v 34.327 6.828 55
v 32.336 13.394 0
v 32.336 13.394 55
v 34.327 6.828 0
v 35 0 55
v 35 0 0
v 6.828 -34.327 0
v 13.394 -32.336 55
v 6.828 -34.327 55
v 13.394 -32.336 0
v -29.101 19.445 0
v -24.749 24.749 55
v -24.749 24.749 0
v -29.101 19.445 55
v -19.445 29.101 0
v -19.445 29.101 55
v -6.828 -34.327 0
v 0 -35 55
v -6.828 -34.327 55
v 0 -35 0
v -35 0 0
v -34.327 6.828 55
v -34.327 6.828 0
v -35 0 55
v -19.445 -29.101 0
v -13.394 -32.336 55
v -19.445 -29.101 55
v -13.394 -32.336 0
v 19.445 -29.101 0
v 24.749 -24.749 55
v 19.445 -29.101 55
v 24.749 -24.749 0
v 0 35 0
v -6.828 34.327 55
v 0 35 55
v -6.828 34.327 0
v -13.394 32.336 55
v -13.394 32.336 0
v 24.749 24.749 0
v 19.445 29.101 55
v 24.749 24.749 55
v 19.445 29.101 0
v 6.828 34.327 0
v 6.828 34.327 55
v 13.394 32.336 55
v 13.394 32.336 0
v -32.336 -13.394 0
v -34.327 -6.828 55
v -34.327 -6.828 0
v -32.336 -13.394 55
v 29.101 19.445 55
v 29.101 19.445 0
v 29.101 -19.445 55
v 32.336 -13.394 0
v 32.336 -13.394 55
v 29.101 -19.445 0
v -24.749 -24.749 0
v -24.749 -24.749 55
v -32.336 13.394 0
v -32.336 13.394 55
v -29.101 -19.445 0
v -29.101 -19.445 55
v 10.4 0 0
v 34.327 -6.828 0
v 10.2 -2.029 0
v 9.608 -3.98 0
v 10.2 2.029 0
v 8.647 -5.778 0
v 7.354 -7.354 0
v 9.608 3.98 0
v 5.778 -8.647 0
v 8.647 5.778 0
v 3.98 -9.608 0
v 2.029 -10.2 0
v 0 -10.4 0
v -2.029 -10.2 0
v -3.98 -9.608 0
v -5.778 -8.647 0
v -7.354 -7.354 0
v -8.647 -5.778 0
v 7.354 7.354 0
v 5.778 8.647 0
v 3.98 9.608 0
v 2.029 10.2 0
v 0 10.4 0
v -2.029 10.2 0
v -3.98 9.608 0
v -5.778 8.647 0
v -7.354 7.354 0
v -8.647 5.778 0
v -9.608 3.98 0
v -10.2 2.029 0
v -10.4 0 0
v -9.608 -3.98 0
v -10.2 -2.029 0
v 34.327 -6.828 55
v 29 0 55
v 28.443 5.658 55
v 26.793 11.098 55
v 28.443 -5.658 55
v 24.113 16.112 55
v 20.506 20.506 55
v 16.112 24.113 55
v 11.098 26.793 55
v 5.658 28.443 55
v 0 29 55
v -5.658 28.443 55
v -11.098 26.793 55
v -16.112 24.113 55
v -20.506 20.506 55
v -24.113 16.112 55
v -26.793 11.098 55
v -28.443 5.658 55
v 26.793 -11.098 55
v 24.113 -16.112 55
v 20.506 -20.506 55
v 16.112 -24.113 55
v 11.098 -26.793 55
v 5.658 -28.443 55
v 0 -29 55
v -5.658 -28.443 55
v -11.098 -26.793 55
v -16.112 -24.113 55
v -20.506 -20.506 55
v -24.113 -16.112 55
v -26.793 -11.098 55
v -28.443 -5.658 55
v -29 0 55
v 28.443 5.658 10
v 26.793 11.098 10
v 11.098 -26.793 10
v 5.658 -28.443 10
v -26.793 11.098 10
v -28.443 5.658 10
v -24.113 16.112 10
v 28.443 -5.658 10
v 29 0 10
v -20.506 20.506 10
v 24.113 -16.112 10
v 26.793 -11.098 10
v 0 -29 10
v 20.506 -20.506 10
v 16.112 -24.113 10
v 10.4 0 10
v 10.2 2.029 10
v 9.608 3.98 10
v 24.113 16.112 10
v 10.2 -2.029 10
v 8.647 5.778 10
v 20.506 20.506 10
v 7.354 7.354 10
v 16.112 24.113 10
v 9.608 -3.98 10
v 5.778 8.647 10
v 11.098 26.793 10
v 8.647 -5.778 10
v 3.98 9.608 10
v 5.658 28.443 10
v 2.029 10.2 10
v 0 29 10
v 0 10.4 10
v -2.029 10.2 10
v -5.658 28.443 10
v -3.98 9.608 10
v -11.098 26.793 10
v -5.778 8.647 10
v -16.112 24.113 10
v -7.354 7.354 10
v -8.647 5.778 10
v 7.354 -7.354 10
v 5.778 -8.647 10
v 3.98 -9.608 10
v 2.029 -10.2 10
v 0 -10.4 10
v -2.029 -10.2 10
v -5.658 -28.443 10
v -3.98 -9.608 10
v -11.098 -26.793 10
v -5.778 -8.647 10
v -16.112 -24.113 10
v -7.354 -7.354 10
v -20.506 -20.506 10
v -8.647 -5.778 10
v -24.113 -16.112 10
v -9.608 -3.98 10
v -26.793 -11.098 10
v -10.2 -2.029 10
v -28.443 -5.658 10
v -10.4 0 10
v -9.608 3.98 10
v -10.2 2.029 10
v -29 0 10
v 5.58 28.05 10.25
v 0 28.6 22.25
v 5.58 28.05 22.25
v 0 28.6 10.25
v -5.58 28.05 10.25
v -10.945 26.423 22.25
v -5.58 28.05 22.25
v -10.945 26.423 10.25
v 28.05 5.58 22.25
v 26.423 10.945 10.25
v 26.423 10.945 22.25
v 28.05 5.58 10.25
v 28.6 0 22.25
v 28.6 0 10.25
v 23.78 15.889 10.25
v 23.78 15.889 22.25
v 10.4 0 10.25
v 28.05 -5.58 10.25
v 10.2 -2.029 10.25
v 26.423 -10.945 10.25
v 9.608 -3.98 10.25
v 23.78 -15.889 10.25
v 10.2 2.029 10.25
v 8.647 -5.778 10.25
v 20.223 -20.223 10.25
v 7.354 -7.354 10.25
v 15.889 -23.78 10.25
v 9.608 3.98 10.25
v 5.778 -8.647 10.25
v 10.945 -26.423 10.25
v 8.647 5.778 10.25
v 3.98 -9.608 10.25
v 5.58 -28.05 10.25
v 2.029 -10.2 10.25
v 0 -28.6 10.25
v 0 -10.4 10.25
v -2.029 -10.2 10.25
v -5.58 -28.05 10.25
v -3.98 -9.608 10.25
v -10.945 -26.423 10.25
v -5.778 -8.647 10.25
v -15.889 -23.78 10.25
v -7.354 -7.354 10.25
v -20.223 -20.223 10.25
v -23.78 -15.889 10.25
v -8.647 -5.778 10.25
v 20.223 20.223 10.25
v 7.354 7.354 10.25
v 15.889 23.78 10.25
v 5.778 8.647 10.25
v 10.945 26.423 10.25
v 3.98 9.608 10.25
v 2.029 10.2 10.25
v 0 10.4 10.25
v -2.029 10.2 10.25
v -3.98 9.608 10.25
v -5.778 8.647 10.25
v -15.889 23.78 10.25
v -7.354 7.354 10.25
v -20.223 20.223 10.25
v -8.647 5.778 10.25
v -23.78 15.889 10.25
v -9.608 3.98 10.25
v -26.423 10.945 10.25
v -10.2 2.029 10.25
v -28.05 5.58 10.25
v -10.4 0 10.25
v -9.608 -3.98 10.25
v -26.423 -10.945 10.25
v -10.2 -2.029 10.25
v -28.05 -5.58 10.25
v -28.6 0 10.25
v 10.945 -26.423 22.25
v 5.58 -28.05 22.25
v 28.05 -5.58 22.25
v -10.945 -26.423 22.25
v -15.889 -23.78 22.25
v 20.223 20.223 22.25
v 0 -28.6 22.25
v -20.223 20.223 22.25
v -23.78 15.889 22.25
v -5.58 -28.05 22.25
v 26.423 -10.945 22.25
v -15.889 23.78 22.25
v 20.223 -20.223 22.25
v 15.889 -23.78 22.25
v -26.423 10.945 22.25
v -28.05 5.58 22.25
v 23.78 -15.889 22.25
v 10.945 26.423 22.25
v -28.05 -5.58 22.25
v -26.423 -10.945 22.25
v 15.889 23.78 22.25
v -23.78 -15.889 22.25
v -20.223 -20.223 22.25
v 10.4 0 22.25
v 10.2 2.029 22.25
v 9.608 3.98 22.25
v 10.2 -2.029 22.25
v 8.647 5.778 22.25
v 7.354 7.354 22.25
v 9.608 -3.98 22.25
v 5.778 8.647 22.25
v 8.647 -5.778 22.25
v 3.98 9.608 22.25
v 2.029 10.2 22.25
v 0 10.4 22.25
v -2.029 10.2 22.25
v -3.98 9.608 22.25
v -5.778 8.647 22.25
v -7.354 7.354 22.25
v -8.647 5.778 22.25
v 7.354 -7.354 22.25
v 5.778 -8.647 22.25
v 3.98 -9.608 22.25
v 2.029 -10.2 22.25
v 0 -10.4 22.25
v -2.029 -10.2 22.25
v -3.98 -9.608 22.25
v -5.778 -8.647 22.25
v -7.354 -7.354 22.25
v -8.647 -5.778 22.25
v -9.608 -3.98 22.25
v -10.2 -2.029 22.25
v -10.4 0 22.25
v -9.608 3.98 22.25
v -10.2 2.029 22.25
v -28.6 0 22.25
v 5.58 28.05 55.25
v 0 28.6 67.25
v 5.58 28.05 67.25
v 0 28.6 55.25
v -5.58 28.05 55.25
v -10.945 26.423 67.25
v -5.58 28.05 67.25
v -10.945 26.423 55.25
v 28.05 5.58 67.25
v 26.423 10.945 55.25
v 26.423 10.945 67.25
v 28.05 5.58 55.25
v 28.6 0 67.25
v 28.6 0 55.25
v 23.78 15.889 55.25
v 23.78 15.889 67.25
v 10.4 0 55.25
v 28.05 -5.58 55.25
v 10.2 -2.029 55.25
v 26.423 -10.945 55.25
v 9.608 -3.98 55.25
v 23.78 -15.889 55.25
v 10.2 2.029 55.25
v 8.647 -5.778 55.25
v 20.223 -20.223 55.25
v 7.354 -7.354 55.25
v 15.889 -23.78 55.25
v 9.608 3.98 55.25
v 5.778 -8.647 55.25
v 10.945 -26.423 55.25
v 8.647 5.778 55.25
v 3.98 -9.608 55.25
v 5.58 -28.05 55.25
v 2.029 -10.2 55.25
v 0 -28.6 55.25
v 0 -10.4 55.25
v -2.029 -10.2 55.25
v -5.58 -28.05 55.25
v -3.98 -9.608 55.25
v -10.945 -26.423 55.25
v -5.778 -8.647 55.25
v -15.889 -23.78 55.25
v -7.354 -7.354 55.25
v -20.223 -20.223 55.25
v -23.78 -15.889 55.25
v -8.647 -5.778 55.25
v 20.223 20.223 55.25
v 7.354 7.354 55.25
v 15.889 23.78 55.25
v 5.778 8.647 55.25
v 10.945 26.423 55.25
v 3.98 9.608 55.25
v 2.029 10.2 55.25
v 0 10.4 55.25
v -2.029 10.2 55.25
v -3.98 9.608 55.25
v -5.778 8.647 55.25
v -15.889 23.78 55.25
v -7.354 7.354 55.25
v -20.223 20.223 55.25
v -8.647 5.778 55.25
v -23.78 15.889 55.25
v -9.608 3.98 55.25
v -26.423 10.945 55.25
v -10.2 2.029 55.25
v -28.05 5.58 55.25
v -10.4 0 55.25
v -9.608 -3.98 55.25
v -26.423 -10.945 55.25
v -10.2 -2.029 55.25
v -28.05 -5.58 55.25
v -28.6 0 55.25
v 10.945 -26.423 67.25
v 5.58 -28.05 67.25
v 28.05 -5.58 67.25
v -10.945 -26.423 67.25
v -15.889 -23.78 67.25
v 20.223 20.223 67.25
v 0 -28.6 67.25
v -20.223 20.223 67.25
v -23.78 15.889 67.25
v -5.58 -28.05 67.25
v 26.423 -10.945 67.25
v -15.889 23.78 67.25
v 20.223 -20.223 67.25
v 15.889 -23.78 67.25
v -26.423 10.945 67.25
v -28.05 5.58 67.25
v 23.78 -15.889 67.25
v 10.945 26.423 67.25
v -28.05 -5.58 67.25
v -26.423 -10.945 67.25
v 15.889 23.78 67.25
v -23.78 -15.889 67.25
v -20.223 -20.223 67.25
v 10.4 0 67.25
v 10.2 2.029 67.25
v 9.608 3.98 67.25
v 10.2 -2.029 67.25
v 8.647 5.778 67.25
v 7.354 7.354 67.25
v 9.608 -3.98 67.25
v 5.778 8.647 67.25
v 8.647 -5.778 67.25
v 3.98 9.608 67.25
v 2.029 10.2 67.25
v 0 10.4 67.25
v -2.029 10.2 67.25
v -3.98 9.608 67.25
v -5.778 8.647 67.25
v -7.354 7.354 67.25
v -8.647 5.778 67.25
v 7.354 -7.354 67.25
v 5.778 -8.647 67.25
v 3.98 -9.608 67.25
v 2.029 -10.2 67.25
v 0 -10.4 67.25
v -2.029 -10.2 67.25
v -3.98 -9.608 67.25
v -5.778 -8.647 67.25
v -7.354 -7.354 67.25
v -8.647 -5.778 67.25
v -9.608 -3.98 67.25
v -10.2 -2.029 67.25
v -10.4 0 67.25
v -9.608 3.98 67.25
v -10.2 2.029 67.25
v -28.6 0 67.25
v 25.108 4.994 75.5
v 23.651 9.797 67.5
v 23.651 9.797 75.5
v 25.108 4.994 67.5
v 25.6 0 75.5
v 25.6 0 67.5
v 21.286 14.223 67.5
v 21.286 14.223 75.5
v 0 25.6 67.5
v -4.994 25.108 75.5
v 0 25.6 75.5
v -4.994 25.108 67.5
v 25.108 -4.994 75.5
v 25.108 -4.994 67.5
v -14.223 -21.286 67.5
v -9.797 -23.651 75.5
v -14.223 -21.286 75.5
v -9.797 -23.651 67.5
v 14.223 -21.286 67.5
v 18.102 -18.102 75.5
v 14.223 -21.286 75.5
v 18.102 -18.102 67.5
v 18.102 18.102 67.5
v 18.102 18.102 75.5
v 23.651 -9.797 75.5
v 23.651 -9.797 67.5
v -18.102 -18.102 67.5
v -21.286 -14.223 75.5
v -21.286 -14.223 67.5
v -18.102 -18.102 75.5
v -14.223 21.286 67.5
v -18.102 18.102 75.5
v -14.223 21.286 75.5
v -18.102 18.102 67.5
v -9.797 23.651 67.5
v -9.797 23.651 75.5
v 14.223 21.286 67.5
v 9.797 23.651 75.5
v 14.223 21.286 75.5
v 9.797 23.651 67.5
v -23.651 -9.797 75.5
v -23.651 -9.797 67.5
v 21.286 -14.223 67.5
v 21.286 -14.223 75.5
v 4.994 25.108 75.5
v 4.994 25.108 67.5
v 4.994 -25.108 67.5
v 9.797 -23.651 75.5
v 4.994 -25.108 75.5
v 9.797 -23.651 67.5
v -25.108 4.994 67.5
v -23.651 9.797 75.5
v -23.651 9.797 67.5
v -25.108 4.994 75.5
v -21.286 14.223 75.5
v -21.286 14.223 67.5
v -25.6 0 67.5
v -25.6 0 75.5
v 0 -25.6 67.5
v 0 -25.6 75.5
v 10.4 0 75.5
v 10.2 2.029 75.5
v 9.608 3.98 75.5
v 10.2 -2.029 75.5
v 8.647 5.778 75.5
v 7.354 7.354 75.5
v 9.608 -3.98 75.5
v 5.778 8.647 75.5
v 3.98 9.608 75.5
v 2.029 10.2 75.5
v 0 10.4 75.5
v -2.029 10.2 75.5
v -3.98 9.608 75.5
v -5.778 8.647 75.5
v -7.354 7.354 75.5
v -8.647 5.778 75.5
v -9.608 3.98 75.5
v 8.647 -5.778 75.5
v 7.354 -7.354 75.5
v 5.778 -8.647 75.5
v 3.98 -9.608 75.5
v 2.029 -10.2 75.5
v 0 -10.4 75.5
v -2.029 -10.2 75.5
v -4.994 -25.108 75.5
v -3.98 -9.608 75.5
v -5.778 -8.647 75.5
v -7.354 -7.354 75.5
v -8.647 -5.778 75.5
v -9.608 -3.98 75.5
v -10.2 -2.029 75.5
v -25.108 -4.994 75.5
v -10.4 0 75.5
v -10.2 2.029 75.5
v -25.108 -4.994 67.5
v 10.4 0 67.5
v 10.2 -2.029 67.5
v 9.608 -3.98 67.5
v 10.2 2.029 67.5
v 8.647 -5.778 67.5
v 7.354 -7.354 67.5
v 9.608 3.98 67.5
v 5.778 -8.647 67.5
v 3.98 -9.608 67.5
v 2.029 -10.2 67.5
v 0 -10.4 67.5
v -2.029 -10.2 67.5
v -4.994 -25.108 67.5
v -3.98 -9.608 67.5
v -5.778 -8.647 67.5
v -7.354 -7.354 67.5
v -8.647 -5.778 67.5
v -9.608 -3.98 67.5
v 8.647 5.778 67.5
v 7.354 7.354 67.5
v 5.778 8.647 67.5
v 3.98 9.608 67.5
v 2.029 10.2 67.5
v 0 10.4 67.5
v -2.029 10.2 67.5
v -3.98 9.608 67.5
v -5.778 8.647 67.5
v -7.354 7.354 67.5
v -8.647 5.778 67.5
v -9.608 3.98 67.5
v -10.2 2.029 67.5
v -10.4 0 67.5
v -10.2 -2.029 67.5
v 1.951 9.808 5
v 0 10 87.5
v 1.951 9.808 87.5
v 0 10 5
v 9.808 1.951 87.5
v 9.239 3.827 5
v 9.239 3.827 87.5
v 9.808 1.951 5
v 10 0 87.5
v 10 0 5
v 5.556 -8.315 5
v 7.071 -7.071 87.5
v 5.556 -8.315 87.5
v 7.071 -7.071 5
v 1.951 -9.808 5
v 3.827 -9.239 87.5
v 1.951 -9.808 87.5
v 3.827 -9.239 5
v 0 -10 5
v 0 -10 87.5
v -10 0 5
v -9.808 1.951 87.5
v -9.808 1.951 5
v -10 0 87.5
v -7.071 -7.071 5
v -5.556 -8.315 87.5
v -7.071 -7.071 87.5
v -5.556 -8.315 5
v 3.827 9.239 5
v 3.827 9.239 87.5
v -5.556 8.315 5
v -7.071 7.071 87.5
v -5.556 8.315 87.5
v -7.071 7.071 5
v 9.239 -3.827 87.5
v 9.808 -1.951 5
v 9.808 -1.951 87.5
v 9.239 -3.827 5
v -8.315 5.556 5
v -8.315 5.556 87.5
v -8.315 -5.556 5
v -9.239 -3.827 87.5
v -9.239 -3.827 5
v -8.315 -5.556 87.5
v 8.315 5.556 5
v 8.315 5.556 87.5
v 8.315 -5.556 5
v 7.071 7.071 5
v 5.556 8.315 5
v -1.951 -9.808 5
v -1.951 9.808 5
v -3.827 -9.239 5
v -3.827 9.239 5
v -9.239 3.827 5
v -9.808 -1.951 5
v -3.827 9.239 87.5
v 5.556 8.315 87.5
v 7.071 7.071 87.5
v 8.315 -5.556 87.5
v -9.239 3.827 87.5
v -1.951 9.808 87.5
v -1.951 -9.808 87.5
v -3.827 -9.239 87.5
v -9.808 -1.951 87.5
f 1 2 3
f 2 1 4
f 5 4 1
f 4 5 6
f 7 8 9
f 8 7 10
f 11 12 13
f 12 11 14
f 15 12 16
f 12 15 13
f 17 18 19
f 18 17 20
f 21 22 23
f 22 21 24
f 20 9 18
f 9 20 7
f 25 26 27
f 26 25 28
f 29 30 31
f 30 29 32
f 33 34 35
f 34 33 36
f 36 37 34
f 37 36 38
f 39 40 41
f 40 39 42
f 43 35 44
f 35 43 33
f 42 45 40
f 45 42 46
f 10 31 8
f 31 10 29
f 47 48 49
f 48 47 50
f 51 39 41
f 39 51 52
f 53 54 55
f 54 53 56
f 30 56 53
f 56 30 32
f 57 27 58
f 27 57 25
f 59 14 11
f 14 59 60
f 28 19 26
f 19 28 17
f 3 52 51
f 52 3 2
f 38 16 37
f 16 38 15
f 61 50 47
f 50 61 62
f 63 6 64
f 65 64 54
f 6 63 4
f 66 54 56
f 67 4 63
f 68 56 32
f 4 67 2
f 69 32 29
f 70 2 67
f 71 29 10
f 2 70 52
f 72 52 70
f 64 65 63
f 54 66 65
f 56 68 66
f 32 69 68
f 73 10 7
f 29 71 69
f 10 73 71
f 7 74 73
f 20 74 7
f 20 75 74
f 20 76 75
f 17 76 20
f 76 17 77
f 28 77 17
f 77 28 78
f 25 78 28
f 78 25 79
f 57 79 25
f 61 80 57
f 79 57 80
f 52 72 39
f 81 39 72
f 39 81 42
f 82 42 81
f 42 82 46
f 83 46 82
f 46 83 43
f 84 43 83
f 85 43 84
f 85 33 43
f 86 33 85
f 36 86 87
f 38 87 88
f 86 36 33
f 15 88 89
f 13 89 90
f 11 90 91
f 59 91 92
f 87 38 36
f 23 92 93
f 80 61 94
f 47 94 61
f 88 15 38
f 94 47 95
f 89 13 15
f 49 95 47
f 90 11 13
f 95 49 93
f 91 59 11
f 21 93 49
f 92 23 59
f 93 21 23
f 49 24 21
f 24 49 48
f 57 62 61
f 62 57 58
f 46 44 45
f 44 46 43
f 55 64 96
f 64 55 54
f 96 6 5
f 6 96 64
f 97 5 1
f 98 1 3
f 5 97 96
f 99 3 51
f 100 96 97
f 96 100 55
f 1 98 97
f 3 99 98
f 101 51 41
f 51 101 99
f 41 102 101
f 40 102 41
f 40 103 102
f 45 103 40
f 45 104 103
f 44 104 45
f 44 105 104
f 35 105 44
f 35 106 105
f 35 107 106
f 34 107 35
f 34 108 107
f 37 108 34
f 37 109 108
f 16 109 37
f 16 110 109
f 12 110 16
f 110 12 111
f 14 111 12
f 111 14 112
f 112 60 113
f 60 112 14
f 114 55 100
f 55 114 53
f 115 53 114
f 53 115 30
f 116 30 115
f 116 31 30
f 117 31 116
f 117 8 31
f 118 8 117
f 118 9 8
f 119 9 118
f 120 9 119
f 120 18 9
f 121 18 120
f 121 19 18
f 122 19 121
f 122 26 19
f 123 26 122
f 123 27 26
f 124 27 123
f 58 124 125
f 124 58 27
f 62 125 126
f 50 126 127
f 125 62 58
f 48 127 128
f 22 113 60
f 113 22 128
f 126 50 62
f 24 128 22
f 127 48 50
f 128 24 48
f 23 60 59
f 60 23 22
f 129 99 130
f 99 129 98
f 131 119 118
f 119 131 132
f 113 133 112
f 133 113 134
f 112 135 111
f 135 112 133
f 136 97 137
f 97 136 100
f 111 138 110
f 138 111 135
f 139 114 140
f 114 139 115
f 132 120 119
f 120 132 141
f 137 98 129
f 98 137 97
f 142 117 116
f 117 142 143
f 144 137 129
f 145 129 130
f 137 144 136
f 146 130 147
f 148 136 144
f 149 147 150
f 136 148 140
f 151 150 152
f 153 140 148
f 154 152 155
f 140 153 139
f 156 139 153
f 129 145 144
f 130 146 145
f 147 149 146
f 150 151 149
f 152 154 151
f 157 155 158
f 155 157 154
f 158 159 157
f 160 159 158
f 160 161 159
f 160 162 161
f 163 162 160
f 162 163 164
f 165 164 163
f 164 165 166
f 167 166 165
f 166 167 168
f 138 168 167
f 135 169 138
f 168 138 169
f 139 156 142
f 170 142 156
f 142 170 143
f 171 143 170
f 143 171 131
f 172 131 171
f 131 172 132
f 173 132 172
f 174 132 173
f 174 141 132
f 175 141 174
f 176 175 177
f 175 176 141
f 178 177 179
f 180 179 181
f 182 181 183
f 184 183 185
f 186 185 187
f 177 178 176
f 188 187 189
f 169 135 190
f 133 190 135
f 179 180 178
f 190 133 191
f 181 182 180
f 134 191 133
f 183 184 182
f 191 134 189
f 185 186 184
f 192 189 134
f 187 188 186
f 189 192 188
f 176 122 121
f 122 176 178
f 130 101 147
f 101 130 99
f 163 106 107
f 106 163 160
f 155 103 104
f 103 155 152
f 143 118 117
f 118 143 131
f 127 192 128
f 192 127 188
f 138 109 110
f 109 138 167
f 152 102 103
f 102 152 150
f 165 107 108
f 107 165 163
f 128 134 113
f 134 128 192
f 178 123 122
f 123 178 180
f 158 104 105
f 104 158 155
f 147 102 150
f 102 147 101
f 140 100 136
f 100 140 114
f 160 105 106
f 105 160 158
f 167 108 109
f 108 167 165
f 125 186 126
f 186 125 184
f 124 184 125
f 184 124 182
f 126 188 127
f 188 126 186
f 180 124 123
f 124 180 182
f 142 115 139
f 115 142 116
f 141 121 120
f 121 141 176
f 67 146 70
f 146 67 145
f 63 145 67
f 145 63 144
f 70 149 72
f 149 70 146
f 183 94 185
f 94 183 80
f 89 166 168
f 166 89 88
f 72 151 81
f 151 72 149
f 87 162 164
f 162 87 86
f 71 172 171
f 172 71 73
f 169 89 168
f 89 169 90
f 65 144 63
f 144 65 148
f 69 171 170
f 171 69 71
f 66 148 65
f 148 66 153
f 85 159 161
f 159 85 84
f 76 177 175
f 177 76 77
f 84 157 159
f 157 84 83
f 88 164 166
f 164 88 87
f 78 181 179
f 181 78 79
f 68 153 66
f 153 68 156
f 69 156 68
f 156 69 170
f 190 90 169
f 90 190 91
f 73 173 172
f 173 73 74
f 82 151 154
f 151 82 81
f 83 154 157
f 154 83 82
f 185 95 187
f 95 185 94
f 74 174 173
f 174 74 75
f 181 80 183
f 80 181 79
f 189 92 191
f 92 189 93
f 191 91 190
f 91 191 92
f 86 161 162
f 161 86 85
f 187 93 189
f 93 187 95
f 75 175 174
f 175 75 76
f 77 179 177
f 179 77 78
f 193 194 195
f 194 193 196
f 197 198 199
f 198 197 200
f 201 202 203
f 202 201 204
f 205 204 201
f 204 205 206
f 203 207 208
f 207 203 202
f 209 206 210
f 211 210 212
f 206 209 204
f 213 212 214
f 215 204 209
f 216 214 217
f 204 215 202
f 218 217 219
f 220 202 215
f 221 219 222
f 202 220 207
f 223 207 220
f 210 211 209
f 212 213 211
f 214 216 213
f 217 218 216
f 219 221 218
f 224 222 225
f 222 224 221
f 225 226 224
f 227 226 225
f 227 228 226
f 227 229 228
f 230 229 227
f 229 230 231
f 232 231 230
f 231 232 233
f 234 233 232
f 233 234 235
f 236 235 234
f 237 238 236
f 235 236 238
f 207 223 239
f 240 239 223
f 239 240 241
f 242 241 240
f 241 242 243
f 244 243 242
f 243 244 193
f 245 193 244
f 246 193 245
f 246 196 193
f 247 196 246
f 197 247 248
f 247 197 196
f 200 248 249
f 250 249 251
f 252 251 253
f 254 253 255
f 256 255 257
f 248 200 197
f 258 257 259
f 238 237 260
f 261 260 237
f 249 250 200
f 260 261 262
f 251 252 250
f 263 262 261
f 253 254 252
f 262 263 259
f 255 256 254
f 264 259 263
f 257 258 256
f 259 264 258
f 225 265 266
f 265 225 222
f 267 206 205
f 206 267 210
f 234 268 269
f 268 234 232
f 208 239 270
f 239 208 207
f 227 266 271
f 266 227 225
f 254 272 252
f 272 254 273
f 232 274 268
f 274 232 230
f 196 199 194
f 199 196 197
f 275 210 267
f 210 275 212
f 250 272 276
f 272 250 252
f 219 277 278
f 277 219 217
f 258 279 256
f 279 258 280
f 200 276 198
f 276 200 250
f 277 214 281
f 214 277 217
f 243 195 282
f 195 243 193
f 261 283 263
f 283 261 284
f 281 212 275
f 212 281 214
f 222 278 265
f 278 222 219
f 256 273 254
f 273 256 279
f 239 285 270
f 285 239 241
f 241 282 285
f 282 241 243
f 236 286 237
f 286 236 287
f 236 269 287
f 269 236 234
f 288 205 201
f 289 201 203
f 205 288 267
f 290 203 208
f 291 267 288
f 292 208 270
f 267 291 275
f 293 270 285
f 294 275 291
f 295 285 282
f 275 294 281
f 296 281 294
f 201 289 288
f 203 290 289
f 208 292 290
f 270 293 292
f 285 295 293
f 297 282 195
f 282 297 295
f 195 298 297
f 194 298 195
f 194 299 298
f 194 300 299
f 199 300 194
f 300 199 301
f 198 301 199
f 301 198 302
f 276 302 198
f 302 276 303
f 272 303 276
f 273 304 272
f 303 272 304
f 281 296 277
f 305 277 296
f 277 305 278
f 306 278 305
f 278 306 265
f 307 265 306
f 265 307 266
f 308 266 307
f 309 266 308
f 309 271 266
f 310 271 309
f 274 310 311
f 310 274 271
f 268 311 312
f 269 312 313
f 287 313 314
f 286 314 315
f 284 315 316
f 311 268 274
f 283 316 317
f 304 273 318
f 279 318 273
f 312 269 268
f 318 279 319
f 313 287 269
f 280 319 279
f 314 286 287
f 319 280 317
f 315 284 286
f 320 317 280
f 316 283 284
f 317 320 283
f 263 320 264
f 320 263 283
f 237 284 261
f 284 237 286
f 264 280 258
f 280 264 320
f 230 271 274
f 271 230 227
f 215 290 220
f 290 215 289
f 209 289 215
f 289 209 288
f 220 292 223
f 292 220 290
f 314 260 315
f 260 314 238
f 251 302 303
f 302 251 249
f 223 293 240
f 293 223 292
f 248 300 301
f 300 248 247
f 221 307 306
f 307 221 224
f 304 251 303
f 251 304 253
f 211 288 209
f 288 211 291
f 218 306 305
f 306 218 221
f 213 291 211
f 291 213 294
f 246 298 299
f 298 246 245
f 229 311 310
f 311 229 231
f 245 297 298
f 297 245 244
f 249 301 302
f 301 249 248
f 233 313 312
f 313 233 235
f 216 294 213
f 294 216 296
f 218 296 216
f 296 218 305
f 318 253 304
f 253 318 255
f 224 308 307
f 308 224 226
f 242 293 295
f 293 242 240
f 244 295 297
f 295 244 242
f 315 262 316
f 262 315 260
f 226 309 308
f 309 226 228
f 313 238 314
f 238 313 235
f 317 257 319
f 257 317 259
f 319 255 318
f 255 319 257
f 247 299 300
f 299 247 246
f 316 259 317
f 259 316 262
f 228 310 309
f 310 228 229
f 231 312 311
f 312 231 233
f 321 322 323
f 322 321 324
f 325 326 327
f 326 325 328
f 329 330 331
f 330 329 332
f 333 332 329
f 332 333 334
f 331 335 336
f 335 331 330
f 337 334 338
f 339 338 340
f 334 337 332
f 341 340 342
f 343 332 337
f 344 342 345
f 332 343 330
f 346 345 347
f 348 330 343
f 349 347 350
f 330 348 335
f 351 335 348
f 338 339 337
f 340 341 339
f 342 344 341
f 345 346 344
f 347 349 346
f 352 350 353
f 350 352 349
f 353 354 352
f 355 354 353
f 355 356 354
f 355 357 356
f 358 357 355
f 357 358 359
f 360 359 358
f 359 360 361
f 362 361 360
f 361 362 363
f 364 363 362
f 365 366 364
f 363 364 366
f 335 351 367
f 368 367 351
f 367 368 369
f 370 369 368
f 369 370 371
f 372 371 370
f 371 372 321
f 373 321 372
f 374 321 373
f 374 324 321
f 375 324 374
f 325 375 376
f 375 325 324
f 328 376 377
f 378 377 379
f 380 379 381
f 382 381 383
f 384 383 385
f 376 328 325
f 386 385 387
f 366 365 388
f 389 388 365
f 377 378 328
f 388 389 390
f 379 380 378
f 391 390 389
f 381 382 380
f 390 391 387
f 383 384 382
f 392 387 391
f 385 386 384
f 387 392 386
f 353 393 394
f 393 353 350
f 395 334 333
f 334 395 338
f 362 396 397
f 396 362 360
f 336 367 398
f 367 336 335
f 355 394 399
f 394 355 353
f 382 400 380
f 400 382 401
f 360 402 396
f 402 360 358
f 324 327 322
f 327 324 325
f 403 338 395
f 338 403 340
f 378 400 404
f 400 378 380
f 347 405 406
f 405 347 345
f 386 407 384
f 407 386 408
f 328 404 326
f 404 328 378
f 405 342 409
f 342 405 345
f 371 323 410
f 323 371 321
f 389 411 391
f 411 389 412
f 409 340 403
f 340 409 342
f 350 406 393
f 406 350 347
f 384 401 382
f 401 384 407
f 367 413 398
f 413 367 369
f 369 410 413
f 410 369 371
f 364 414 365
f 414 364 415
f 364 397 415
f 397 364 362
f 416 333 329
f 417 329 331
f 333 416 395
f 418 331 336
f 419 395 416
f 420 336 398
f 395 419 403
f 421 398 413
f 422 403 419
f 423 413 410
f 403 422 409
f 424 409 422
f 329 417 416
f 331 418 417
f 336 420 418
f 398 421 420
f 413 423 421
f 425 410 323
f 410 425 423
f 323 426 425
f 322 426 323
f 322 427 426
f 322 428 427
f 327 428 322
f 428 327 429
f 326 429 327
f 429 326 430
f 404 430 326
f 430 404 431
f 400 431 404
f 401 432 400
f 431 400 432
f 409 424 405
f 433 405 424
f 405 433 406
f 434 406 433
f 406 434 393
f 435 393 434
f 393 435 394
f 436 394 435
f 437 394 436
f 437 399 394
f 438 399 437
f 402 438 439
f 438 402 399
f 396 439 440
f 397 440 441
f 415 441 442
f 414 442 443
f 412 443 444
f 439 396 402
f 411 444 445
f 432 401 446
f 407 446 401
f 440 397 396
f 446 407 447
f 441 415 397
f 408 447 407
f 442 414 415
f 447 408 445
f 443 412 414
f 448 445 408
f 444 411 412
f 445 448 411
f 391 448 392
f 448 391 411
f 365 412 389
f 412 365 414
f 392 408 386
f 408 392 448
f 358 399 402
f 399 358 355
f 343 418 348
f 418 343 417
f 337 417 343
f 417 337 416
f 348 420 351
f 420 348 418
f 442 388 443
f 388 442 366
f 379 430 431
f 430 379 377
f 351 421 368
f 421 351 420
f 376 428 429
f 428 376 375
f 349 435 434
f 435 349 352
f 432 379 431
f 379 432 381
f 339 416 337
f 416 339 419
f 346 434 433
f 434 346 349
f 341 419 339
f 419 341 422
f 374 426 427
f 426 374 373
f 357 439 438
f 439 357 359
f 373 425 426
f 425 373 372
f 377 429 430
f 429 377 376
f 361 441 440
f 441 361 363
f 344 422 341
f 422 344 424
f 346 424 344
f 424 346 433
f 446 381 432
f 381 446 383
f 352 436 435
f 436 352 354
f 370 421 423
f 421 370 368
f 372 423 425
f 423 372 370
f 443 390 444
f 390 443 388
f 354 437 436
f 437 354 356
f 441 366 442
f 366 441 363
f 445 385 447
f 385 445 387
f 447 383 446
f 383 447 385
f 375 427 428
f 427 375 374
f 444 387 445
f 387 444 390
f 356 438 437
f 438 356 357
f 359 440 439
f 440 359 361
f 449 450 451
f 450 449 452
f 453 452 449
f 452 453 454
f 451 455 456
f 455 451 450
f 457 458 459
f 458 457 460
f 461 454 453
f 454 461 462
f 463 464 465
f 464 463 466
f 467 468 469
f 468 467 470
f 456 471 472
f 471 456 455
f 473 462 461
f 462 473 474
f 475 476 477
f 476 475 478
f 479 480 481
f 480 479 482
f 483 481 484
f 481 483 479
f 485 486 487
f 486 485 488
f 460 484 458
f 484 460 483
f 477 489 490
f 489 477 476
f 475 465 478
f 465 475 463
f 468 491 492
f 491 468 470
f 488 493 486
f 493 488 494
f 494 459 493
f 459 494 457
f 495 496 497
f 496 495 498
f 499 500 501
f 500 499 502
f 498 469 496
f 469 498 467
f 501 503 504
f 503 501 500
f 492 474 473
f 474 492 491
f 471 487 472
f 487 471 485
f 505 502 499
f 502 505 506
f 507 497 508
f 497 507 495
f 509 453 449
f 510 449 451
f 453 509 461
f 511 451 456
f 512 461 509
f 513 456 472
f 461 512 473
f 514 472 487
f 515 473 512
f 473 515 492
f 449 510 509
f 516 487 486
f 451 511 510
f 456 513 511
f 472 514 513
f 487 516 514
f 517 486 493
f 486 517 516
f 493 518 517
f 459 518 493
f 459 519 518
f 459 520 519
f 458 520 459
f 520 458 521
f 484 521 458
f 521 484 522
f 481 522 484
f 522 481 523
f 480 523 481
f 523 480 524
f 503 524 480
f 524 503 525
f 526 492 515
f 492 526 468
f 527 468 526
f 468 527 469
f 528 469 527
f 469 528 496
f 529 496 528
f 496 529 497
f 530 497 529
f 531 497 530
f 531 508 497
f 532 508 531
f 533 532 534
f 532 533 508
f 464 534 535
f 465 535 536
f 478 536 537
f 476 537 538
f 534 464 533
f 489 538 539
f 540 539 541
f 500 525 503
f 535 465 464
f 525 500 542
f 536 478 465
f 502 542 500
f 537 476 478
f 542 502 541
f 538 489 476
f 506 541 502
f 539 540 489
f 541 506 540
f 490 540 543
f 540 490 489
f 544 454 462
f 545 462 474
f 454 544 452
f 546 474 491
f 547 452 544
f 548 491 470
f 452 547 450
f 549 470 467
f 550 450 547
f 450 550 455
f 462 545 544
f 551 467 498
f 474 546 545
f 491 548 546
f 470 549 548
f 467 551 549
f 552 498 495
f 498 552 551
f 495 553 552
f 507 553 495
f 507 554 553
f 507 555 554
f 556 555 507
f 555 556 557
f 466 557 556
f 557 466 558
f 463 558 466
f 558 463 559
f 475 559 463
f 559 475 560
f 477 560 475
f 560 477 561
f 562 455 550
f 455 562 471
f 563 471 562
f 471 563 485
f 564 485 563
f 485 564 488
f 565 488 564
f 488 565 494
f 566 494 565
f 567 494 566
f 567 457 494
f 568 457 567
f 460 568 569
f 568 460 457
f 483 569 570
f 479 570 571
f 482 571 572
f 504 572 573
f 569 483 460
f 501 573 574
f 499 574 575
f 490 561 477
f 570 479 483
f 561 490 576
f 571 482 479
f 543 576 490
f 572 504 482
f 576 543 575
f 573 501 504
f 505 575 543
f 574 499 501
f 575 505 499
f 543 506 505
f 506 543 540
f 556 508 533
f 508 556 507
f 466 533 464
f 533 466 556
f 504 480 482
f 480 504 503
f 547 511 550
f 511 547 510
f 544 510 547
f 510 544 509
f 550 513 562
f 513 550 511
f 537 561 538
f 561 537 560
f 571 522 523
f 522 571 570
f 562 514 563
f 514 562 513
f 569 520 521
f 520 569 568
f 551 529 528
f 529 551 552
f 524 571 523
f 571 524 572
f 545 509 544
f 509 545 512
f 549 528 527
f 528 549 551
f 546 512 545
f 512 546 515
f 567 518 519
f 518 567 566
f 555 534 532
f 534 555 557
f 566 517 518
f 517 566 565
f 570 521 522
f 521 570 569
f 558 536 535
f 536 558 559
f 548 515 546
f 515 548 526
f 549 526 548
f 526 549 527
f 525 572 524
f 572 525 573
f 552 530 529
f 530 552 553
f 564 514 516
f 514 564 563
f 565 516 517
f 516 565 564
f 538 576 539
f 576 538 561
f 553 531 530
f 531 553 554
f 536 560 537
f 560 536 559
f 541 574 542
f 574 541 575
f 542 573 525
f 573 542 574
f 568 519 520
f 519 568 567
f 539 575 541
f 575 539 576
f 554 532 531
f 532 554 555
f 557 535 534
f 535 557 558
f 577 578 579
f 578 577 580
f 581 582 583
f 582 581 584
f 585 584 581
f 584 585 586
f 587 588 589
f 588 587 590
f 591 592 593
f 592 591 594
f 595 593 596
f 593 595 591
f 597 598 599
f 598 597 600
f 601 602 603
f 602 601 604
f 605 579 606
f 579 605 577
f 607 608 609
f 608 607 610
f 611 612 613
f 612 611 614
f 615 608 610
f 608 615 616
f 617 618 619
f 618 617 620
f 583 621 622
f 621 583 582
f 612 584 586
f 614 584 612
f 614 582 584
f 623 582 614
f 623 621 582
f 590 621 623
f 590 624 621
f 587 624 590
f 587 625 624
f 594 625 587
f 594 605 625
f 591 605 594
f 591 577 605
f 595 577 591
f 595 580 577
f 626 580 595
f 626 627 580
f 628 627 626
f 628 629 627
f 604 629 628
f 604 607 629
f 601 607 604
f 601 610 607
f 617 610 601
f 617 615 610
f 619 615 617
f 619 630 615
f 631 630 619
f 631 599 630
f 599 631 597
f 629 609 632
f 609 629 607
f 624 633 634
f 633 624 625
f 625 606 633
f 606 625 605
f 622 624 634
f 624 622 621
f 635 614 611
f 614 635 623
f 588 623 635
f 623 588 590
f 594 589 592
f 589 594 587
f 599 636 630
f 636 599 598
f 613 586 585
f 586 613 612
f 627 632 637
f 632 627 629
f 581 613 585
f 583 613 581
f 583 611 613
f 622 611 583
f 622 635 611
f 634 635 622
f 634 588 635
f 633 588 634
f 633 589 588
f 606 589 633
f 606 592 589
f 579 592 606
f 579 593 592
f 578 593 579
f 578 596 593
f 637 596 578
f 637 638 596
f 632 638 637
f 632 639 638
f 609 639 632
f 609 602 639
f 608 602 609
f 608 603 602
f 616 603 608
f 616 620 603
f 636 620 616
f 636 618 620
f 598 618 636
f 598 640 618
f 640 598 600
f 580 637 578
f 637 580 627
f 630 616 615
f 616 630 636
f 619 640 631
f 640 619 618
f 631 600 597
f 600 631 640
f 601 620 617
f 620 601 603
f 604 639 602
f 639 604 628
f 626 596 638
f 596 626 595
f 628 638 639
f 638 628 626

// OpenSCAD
$fn = 32;

// ------------------------------------------------------------------------
// Bearing housing: housing d70, two bearings and a shaft
// Every part is its own module, assembly() places them once.
// ------------------------------------------------------------------------

// --- part 1 ---
module housing() {
  difference() {
    cylinder(h = 55, d = 70);
    translate([0, 0, 10]) cylinder(h = 46, d = 58);
    translate([0, 0, -1]) cylinder(h = 12, d = 20.8);
  }
}

// --- part 2 ---
module bearing_lower() {
  difference() {
      translate([0, 0, 0]) cylinder(h = 12, d = 57.2);
      translate([0, 0, -1]) cylinder(h = 14, d = 20.8);
    }
}

// --- part 3 ---
module bearing_upper() {
  difference() {
      translate([0, 0, 0]) cylinder(h = 12, d = 57.2);
      translate([0, 0, -1]) cylinder(h = 14, d = 20.8);
    }
}

// --- part 4 ---
module spacer() {
  difference() {
      translate([0, 0, 0]) cylinder(h = 8, d = 51.2);
      translate([0, 0, -1]) cylinder(h = 10, d = 20.8);
    }
}

// --- part 5 ---
module shaft() {
  translate([0, 0, -41.25]) cylinder(h = 82.5, d = 20);
}

// --- assembly ---
module assembly() {
  translate([0, 0, 0]) rotate([0, 0, 0]) housing();
  translate([0, 0, 10.25]) rotate([0, 0, 0]) bearing_lower();
  translate([0, 0, 55.25]) rotate([0, 0, 0]) bearing_upper();
  translate([0, 0, 67.5]) rotate([0, 0, 0]) spacer();
  translate([0, 0, 46.25]) rotate([0, 0, 0]) shaft();
}

assembly();
